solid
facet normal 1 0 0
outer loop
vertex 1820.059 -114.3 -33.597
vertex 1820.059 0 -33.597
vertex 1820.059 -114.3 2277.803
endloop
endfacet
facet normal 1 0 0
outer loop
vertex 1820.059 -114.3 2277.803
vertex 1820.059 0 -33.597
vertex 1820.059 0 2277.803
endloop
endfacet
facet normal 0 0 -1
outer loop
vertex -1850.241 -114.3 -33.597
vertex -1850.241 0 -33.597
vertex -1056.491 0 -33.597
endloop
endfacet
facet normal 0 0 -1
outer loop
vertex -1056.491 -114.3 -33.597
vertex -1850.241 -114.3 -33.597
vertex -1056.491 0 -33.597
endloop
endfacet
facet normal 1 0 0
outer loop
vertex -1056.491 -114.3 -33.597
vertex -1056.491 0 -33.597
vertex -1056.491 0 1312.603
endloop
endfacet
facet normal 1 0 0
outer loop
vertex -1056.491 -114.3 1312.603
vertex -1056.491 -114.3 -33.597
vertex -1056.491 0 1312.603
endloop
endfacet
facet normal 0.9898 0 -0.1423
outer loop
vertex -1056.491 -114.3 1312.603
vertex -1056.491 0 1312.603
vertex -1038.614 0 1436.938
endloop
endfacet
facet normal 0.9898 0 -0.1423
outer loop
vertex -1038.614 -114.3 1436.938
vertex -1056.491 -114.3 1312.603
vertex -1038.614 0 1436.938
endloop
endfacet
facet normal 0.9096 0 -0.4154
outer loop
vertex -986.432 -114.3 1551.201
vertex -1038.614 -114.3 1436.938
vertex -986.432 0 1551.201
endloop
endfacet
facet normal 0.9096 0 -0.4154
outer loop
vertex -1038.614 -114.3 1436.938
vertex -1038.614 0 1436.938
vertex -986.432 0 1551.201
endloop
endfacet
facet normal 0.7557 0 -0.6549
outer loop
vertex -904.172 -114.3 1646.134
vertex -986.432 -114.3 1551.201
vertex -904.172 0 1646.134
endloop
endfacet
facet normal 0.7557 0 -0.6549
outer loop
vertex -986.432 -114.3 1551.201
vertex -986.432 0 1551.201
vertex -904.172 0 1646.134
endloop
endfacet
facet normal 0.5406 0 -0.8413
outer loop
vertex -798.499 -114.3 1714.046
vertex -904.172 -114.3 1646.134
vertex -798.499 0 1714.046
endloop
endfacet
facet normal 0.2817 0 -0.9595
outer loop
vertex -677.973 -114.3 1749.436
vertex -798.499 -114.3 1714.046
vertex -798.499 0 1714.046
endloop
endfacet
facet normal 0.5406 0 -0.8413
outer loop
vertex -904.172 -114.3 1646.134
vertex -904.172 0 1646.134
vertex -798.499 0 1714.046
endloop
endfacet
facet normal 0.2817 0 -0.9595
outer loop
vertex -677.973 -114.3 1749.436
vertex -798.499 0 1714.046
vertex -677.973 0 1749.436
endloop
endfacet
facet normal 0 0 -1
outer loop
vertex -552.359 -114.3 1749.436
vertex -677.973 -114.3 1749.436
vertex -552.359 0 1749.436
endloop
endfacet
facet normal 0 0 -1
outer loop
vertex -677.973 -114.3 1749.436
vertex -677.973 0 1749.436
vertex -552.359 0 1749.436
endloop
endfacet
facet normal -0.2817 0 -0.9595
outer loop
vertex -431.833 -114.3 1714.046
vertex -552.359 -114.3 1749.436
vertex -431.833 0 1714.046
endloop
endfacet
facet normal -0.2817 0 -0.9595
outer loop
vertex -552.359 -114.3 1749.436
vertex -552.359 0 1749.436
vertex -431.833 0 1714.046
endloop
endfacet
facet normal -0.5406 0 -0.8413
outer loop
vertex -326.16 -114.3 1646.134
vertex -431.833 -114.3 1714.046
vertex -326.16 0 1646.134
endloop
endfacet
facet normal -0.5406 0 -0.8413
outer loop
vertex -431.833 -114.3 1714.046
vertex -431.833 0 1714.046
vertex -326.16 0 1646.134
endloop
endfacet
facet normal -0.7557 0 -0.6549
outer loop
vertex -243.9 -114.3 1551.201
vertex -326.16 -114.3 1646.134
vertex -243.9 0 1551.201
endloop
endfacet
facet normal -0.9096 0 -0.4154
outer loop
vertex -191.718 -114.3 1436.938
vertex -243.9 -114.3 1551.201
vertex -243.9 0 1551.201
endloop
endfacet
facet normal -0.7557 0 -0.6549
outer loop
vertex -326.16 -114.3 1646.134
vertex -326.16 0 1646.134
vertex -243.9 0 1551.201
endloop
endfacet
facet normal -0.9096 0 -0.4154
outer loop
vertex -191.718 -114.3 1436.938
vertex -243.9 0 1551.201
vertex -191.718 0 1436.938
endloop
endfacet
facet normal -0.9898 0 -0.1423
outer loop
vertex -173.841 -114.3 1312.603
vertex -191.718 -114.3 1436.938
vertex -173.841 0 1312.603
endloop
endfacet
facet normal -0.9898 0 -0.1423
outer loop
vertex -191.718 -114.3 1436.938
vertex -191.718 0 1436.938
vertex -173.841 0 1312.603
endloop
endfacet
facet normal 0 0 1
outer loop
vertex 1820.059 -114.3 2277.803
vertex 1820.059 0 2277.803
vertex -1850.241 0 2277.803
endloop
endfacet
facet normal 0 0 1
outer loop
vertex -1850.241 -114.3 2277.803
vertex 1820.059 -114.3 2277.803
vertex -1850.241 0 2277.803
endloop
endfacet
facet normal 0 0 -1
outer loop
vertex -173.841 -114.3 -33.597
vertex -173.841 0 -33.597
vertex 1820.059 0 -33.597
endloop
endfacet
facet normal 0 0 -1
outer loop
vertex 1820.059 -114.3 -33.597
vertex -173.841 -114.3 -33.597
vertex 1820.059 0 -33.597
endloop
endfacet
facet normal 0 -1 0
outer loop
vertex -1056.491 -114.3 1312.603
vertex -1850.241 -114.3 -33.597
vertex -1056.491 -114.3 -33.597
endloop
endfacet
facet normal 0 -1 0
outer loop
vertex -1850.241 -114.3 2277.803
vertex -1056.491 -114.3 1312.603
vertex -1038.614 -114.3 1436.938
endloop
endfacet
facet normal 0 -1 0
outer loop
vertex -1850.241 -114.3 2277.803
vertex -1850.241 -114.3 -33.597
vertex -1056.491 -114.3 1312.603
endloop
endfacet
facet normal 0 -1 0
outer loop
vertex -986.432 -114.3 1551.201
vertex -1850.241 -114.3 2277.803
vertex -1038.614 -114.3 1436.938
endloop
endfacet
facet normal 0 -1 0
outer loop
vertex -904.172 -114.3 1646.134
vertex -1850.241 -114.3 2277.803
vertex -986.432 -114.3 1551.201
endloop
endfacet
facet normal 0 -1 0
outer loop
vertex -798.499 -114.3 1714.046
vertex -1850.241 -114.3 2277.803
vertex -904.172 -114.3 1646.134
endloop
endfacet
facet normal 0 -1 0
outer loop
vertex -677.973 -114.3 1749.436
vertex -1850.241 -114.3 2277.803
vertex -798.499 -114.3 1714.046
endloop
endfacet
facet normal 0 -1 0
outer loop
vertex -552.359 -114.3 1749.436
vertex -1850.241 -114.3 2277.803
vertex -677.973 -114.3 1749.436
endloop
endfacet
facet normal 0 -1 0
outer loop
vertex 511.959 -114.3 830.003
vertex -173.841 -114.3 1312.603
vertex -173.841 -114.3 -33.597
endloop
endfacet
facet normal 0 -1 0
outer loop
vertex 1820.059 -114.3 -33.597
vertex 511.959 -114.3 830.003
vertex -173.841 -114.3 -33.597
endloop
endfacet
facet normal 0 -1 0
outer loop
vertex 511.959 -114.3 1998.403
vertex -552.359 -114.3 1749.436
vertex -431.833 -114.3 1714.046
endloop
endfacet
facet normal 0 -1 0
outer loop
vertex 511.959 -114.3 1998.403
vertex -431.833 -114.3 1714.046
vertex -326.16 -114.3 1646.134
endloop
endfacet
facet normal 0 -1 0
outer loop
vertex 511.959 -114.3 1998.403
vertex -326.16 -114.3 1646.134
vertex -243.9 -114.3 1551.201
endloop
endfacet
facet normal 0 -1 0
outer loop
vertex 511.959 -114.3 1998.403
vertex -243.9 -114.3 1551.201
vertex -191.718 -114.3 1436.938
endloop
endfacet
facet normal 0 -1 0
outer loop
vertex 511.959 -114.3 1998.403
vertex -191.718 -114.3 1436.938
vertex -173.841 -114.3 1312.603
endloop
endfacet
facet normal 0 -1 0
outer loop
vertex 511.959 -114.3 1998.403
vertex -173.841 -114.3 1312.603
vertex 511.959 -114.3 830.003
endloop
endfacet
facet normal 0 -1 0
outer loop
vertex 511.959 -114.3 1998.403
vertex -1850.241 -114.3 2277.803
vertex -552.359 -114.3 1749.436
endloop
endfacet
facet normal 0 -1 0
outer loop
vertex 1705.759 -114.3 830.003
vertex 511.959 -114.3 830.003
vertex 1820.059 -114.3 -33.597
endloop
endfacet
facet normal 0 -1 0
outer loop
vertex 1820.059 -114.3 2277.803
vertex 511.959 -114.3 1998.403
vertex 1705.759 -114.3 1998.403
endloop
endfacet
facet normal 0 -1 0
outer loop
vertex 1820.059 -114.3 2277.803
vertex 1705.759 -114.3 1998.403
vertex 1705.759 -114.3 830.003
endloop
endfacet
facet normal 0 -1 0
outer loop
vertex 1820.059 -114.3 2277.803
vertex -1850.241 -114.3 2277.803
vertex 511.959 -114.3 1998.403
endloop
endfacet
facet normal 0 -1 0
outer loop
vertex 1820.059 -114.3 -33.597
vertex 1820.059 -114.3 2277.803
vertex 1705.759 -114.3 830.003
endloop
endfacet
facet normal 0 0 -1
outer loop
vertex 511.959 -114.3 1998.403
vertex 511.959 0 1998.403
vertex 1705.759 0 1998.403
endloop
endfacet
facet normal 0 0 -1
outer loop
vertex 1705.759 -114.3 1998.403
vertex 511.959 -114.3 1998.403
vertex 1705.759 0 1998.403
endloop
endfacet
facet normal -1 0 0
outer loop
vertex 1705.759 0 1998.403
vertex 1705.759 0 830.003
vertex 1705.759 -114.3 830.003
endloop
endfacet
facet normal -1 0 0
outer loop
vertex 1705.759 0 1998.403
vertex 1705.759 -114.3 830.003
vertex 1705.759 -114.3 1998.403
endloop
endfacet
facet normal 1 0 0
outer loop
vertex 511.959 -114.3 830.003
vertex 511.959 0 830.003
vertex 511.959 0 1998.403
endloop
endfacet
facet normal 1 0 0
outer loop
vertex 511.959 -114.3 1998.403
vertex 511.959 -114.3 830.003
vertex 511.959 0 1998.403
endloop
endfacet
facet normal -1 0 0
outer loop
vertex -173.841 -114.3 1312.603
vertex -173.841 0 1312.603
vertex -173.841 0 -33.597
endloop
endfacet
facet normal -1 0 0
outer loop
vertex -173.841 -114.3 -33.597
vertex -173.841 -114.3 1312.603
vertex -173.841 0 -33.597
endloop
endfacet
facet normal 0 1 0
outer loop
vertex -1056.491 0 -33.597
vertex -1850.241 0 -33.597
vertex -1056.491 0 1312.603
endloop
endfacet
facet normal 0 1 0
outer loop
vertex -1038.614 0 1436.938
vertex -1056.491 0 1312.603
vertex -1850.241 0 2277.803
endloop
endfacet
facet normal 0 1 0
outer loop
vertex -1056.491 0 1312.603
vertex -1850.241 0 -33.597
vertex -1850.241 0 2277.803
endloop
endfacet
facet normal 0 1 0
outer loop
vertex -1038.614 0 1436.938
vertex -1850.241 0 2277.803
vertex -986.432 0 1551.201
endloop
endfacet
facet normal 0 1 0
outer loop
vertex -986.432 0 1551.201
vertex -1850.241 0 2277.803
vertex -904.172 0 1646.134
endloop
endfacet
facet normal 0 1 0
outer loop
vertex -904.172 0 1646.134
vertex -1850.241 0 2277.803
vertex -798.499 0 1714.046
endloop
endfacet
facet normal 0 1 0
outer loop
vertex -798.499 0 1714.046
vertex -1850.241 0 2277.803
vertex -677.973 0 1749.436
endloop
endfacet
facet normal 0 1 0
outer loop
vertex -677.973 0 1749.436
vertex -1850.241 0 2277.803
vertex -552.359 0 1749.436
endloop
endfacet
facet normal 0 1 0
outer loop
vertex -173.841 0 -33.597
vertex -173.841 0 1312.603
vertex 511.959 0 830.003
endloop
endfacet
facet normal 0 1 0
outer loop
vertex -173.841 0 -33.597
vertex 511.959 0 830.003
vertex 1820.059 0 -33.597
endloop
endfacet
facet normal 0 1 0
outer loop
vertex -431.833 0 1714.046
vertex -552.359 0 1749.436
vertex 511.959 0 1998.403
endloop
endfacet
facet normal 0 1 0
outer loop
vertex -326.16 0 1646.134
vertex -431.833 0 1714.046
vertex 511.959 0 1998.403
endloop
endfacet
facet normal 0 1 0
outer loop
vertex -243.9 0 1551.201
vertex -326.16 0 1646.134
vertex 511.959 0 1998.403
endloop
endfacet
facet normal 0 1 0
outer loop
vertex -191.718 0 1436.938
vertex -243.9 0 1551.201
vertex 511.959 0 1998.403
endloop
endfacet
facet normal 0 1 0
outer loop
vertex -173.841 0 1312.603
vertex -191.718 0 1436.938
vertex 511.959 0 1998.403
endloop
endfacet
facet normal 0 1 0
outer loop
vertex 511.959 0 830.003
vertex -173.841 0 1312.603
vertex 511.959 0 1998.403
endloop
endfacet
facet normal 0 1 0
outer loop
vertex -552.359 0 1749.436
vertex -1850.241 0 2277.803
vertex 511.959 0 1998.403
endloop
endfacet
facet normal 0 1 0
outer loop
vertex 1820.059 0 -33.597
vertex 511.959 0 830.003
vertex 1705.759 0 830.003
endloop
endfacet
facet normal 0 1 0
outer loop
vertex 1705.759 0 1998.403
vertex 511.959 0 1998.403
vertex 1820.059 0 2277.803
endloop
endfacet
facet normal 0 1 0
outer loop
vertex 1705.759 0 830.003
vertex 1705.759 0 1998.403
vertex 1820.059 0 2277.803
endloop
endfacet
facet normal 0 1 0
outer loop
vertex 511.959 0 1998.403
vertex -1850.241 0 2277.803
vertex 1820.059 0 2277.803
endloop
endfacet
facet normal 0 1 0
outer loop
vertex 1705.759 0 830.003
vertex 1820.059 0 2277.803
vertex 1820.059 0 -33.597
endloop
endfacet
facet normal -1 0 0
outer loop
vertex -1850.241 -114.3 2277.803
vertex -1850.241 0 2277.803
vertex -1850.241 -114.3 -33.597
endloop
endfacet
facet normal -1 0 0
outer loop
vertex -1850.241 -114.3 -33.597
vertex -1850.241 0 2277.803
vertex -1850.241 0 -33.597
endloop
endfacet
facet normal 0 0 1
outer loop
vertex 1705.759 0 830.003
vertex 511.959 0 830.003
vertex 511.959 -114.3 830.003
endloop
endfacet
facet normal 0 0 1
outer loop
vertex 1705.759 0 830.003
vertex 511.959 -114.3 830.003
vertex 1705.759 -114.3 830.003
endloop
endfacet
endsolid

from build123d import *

# Parameters (mm, degrees)
F0_W     = 1193.8
F0_H     = 1168.4
F1_DEPTH = 114.3


with BuildPart() as f1:
    # F0 (on Front) → F1 (new body)
    with BuildSketch(Plane.XZ):
        with BuildLine():
            Line((1820.058993, 2277.802728), (-1850.241007, 2277.802728))
            Line((-1850.241007, 2277.802728), (-1850.241007, -33.597272))
            Line((-1850.241007, -33.597272), (-1056.491007, -33.597272))
            Line((-1056.491007, -33.597272), (-1056.491007, 1312.602728))
            ThreePointArc((-1056.491007, 1312.602728), (-615.166007, 1753.927728), (-173.841007, 1312.602728))
            Line((-173.841007, 1312.602728), (-173.841007, -33.597272))
            Line((-173.841007, -33.597272), (1820.058993, -33.597272))
            Line((1820.058993, -33.597272), (1820.058993, 2277.802728))
        make_face()
        with Locations((1108.858993, 1414.202728)):
            Rectangle(F0_W, F0_H, mode=Mode.SUBTRACT)
    extrude(amount=F1_DEPTH)


solid = f1.part
